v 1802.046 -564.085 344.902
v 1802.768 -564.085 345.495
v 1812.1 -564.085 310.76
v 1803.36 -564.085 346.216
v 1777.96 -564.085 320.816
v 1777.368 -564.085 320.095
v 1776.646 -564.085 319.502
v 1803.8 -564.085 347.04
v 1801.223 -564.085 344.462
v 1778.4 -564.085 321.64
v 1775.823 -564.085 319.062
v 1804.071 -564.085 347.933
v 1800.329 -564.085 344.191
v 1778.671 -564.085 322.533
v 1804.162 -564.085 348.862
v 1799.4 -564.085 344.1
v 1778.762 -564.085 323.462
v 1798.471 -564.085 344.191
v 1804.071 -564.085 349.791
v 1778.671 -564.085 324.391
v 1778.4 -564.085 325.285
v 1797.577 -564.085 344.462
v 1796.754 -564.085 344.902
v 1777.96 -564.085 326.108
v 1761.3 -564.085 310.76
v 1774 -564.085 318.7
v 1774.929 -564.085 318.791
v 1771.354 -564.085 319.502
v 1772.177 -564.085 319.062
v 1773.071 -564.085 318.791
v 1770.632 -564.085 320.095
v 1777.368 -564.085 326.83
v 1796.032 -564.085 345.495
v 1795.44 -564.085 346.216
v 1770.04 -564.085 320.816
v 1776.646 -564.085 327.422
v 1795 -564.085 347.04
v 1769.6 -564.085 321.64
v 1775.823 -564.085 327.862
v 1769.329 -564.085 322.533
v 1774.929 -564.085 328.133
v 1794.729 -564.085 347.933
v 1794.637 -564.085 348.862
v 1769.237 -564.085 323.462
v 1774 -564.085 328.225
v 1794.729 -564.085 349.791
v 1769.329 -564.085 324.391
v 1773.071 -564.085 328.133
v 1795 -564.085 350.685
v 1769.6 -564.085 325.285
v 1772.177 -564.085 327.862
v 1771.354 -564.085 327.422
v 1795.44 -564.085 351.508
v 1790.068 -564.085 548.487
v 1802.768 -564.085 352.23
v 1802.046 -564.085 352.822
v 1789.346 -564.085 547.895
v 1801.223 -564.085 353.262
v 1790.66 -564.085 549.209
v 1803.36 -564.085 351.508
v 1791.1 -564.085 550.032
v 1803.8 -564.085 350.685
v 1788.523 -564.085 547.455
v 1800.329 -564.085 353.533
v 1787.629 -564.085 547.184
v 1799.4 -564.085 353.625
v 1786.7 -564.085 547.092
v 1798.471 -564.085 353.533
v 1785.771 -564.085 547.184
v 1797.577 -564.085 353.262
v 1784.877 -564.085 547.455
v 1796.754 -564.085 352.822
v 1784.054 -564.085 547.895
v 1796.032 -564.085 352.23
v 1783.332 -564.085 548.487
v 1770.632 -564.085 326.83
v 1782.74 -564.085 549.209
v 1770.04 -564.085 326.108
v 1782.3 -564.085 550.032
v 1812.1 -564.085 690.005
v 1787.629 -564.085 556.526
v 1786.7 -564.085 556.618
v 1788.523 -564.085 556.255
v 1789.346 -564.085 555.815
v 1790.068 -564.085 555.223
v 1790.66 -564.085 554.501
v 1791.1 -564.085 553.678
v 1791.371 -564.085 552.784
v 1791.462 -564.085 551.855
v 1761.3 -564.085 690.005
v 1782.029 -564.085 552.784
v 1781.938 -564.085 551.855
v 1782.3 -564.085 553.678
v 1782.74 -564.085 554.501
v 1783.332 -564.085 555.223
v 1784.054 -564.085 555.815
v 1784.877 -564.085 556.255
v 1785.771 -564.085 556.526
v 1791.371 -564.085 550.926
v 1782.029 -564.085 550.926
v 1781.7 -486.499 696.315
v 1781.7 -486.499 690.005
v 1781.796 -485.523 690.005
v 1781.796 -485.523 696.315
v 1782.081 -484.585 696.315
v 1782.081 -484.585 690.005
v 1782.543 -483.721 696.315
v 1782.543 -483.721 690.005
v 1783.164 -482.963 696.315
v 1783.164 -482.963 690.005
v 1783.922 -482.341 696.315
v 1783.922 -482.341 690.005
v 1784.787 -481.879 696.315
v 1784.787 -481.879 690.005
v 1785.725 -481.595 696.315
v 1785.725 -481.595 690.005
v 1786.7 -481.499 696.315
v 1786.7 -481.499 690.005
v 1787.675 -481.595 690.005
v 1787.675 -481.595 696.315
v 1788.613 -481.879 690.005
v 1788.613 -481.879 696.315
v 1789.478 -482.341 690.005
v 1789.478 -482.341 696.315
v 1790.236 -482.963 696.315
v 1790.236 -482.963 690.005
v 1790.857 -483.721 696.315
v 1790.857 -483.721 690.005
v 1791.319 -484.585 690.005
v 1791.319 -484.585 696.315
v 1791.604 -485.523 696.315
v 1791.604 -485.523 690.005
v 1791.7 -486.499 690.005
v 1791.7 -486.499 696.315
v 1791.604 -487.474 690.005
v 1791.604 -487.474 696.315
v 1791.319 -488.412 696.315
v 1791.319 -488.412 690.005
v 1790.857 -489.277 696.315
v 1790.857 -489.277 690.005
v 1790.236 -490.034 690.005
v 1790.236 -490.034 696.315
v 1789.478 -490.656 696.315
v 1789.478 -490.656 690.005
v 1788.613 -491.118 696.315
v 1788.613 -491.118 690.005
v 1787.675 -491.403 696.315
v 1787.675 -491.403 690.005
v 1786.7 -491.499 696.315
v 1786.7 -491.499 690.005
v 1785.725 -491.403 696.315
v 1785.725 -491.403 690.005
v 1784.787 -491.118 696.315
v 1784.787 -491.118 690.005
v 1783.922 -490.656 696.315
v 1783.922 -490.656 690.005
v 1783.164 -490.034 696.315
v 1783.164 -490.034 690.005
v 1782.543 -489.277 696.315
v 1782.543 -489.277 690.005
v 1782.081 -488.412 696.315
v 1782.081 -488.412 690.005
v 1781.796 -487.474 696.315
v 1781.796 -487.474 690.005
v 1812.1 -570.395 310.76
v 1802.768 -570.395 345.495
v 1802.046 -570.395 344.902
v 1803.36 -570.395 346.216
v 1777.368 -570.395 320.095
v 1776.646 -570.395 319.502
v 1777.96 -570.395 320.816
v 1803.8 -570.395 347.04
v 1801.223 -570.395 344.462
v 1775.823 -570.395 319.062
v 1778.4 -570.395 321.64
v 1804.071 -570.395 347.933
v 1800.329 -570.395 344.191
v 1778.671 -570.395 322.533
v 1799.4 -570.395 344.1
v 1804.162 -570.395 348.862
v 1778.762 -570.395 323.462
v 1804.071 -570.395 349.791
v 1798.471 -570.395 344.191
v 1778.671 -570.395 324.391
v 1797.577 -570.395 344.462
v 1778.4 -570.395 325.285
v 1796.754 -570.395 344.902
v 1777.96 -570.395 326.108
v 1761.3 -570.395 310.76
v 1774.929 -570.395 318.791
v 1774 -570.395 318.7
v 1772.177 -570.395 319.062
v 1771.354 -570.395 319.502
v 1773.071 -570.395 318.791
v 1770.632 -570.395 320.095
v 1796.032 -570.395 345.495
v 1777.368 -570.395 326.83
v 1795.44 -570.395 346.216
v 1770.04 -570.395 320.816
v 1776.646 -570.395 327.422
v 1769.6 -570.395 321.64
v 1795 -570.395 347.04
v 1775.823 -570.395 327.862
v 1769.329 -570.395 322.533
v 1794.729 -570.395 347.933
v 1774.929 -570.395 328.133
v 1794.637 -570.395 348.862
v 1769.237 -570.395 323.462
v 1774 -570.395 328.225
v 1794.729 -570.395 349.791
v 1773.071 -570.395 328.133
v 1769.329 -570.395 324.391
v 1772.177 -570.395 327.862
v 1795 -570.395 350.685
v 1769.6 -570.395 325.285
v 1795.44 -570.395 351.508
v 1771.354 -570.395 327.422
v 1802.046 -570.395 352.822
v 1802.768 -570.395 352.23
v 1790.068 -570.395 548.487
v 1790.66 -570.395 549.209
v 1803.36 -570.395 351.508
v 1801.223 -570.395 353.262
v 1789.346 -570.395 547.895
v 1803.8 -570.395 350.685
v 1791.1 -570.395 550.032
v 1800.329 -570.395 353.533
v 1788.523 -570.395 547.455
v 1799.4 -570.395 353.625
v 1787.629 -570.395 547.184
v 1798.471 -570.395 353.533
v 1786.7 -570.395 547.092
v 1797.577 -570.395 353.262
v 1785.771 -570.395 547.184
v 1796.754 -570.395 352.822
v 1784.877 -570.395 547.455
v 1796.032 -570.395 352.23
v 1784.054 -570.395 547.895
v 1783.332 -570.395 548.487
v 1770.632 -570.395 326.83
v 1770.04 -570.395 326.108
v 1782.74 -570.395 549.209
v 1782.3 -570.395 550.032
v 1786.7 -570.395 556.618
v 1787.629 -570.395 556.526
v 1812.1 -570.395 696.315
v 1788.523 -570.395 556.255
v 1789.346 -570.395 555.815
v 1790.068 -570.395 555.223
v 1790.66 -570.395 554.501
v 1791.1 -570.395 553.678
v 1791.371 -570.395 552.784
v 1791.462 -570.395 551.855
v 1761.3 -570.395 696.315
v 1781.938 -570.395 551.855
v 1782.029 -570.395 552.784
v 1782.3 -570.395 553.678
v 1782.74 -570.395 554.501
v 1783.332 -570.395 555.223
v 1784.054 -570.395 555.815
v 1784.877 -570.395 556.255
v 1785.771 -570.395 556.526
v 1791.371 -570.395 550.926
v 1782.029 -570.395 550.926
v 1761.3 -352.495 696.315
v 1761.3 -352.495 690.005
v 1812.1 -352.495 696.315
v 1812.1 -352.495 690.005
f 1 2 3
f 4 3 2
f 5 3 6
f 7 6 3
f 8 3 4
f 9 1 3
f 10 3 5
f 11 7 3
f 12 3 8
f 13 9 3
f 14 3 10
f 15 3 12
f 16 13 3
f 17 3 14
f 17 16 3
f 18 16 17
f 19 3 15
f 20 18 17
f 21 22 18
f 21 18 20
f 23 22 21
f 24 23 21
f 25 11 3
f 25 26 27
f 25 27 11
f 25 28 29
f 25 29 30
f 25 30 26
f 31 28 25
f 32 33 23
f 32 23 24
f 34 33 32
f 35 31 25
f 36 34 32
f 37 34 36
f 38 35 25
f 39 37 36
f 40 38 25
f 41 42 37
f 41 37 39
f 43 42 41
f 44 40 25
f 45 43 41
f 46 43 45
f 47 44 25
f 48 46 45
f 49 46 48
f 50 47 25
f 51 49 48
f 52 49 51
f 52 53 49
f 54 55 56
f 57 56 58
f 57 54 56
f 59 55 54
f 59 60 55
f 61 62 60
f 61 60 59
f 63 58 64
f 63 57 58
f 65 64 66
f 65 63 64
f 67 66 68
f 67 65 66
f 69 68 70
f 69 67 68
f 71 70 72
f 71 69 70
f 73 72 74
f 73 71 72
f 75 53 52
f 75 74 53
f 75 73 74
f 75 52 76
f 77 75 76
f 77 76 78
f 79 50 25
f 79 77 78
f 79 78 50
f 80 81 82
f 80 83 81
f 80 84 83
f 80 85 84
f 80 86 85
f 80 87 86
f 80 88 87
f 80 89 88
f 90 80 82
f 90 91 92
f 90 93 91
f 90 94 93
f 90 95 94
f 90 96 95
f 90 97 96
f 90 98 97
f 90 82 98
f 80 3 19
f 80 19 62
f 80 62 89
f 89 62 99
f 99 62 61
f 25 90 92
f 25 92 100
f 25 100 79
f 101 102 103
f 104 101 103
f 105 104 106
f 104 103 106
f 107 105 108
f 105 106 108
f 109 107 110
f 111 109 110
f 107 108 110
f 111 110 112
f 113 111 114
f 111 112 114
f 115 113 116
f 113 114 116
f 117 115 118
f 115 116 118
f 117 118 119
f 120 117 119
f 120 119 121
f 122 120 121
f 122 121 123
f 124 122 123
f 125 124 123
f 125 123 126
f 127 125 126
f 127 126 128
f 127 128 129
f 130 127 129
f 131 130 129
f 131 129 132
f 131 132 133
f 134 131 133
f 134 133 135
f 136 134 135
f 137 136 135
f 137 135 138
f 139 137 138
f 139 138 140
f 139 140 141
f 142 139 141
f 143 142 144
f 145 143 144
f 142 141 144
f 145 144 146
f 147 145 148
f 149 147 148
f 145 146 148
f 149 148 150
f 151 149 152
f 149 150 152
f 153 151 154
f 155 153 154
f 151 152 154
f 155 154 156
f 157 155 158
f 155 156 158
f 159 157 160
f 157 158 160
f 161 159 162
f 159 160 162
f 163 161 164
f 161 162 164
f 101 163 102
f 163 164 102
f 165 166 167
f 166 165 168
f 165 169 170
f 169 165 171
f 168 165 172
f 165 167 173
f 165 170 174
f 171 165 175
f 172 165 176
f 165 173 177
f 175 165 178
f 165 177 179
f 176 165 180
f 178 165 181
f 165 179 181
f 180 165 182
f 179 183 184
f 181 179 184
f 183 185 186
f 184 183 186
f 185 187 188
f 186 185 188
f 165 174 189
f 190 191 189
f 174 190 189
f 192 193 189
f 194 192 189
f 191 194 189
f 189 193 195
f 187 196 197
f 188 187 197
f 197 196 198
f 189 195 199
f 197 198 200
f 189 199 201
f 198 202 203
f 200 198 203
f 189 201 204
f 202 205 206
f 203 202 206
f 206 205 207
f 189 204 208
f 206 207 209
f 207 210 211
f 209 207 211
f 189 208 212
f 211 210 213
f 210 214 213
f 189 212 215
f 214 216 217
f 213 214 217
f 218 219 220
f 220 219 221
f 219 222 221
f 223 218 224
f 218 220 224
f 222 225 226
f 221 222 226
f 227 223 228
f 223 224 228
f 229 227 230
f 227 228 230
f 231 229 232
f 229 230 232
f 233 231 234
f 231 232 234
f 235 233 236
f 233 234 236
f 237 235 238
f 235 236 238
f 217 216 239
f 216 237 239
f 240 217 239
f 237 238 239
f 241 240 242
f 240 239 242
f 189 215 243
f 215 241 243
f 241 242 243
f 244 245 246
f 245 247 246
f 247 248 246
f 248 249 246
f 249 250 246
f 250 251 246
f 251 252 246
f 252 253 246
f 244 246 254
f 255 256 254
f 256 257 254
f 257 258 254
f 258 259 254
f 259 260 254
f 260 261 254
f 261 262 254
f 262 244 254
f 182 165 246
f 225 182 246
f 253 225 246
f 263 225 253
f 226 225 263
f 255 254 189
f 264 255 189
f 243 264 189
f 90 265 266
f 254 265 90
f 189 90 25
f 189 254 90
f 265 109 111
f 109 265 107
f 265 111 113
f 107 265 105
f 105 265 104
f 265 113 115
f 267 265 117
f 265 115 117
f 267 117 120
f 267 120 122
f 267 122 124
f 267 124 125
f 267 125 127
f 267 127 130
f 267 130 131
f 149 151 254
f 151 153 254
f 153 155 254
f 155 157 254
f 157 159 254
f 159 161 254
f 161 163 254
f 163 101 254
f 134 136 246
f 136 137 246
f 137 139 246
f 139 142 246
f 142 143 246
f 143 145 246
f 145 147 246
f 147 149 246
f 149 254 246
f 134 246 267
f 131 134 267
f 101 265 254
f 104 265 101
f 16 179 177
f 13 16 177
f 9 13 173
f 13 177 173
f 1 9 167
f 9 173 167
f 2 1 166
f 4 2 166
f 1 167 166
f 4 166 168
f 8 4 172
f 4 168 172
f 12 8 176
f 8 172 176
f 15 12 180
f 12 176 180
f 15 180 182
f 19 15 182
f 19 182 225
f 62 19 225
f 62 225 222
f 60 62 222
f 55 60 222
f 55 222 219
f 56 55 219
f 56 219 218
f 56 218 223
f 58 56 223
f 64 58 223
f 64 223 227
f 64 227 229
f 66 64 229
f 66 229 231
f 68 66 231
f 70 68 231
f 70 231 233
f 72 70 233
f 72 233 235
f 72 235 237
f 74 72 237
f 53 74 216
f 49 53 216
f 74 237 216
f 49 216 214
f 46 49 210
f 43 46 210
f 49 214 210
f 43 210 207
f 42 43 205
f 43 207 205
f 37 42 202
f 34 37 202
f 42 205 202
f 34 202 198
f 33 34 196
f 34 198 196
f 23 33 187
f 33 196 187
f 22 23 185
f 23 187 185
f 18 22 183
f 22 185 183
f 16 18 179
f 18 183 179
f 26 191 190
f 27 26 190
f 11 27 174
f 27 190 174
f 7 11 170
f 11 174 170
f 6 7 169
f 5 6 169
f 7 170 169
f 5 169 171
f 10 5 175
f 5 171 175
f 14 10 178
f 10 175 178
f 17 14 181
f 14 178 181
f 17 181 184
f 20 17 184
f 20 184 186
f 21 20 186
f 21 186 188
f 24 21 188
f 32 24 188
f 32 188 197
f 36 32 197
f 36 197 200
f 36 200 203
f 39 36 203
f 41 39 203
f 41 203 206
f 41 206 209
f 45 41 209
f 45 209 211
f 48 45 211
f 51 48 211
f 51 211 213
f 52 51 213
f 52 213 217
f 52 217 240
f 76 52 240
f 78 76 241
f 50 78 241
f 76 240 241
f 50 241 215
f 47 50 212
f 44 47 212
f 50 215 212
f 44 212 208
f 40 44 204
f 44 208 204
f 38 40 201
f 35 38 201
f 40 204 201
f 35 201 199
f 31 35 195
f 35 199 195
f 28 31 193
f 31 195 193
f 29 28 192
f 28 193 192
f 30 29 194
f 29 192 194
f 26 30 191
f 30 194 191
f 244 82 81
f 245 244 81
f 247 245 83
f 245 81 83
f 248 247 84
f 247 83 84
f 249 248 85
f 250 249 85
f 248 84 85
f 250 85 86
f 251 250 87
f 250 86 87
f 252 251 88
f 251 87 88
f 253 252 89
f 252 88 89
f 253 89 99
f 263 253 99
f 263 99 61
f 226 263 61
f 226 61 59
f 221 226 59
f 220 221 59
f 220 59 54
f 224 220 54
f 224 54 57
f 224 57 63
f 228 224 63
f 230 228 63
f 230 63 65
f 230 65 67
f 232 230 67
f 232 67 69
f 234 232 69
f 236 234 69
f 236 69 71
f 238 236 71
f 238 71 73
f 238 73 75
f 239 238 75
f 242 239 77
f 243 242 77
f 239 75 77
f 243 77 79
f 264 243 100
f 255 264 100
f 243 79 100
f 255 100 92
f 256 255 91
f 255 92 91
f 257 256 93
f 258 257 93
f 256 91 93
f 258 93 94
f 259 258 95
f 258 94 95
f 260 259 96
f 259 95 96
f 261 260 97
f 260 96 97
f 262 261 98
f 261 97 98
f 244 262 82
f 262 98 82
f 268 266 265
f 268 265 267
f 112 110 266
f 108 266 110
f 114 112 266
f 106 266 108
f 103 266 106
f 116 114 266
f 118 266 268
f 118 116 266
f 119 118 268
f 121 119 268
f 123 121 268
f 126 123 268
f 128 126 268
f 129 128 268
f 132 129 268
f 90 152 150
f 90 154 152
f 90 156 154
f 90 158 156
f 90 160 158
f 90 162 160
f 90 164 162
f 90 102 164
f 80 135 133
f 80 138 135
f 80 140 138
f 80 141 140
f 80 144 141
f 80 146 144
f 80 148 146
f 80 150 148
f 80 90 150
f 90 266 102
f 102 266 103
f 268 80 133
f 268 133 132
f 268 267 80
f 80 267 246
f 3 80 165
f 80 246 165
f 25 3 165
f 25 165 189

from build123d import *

# Parameters (mm, degrees)
CROQUIS2_W              = 50.8
CROQUIS2_H              = 6.31
CROQUIS3_W              = 50.8
CROQUIS3_H              = 6.31
CROQUIS4_W              = 60
CROQUIS4_H              = 53.155
SALIENTE_EXTRUIR1_DEPTH = 6.31
CROQUIS5_W              = 60
CROQUIS5_H              = 6.31
CORTAR_EXTRUIR1_DEPTH   = 6.31
CORTAR_EXTRUIR2_DEPTH   = 634
CROQUIS8_W              = 50.8
CROQUIS8_H              = 6.31
SALIENTE_EXTRUIR2_DEPTH = 63.5
CROQUIS9_R              = 5
CORTAR_EXTRUIR3_DEPTH   = 10
CROQUIS10_W             = 790.847933
CROQUIS10_H             = 6.31
CORTAR_EXTRUIR4_DEPTH   = 286
CROQUIS11_W             = 50.8
CROQUIS11_H             = 6.31
CROQUIS11_W_2           = 210
CORTAR_EXTRUIR5_DEPTH   = 13.11
CROQUIS12_W             = 50.8
CROQUIS12_H             = 6.31
SALIENTE_EXTRUIR3_DEPTH = 6.35
CROQUIS13_W             = 50.8
CROQUIS13_H             = 6.35
CORTAR_EXTRUIR6_DEPTH   = 6.35
CROQUIS14_W             = 260.8
CROQUIS14_H             = 6.31
CORTAR_EXTRUIR7_DEPTH   = 6.31
CROQUIS15_W             = 50.8
CROQUIS15_H             = 6.31
CORTAR_EXTRUIR8_DEPTH   = 6.31
CROQUIS16_W             = 78.776397836
CROQUIS16_H             = 454.479218284
CORTAR_EXTRUIR9_DEPTH   = 128
CROQUIS22_R             = 4.7625
CORTAR_EXTRUIR15_DEPTH  = 33
CROQUIS24_R             = 5.000000022
CORTAR_EXTRUIR18_DEPTH  = 33
CROQUIS25_R             = 4.7625
CORTAR_EXTRUIR19_DEPTH  = 50
CROQUIS26_W             = 50.8
CROQUIS26_H             = 6.31
SALIENTE_EXTRUIR4_DEPTH = 100


with BuildPart() as part:
    # Barrer1: sweep along a curve in space
    with BuildLine() as barrer1_path:
        Line((0, 0, 0), (0, -567.24, 0))
        Line((0, -567.24, 0), (0, -567.24, 336.2))
        Line((0, -567.24, 336.2), (1786.7, -567.24, 336.2))
        Line((1786.7, -567.24, 336.2), (1786.7, -567.24, 693.16))
        Line((1786.7, -567.24, 693.16), (1786.7, -436.23, 693.16))
        Line((1786.7, -436.23, 693.16), (1786.7, -436.23, 1487.162933))
    # Croquis2 → Barrer1 (sweep)
    with BuildSketch(Plane(origin=(0, 0, 0), x_dir=(1, 0, 0), z_dir=(0, 1, 0))):
        Rectangle(CROQUIS2_W, CROQUIS2_H)
        with Locations((210, 0)):
            Rectangle(CROQUIS2_W, CROQUIS2_H)
    sweep(path=barrer1_path.line, transition=Transition.RIGHT)

    # Barrer4: sweep along a curve in space
    with BuildLine() as barrer4_path:
        Line((-0.201028049, -3.155, -3.155), (-0.201028049, -3.155, -207.155))
        Line((-0.201028049, -3.155, -207.155), (-0.201028049, -53.155, -207.155))
    # Croquis3 → Barrer4 (sweep)
    with BuildSketch(Plane(origin=(0, 0, -3.155), x_dir=(-1, 0, 0), z_dir=(0, 0, -1))):
        with Locations((-210, -3.155)):
            Rectangle(CROQUIS3_W, CROQUIS3_H)
        with Locations((0, -3.155)):
            Rectangle(CROQUIS3_W, CROQUIS3_H)
    sweep(path=barrer4_path.line, transition=Transition.RIGHT)

    # Croquis4 → Saliente-Extruir1 (add)
    with BuildSketch(Plane(origin=(0, 0, -210.31), x_dir=(-1, 0, 0), z_dir=(0, 0, -1))):
        with Locations((-154.6, -26.5775)):
            Rectangle(CROQUIS4_W, CROQUIS4_H)
    extrude(amount=-SALIENTE_EXTRUIR1_DEPTH)

    # Croquis5 → Cortar-Extruir1 (cut)
    with BuildSketch(Plane.XY.offset(-204)):
        with Locations((154.6, -3.155)):
            Rectangle(CROQUIS5_W, CROQUIS5_H)
    extrude(amount=-CORTAR_EXTRUIR1_DEPTH, mode=Mode.SUBTRACT)

    # Croquis7 → Cortar-Extruir2 (cut)
    with BuildSketch(Plane(origin=(0, 0, 0), x_dir=(1, 0, 0), z_dir=(0, 1, 0))):
        Polygon((1761.3, -361.6), (2022.1, -361.6), (2022.1, 278.600557529), (-188.115947115, 278.600557529), (-188.115947115, -361.6), align=None)
    extrude(amount=-CORTAR_EXTRUIR2_DEPTH, mode=Mode.SUBTRACT)

    # Croquis8 → Saliente-Extruir2 (add)
    with BuildSketch(Plane(origin=(0, 0, 361.6), x_dir=(-1, 0, 0), z_dir=(0, 0, -1))):
        with Locations((-1786.7, -567.24)):
            Rectangle(CROQUIS8_W, CROQUIS8_H)
    extrude(amount=SALIENTE_EXTRUIR2_DEPTH)

    # Croquis9 → Cortar-Extruir3 (cut)
    with BuildSketch(Plane(origin=(0, -433.075, 0), x_dir=(1, 0, 0), z_dir=(0, 1, 0))):
        with Locations(Location((1786.7, -1454.162933, 0), (0, 0, 270))):
            Circle(CROQUIS9_R)
        with Locations(Location((1786.7, -1234.162933, 0), (0, 0, 270))):
            Circle(CROQUIS9_R)
        with Locations(Location((1996.7, -1234.162933, 0), (0, 0, 270))):
            Circle(CROQUIS9_R)
        with Locations(Location((1996.7, -1454.162933, 0), (0, 0, 270))):
            Circle(CROQUIS9_R)
    extrude(amount=-CORTAR_EXTRUIR3_DEPTH, mode=Mode.SUBTRACT)

    # Croquis10 → Cortar-Extruir4 (cut)
    with BuildSketch(Plane(origin=(2022.1, 0, 0), x_dir=(0, 0, -1), z_dir=(1, 0, 0))):
        with Locations((-1091.7389665, -436.23)):
            Rectangle(CROQUIS10_W, CROQUIS10_H)
    extrude(amount=-CORTAR_EXTRUIR4_DEPTH, mode=Mode.SUBTRACT)

    # Croquis11 → Cortar-Extruir5 (cut)
    with BuildSketch(Plane(origin=(0, -433.075, 0), x_dir=(1, 0, 0), z_dir=(0, 1, 0))):
        with Locations((1996.7, -693.16)):
            Rectangle(CROQUIS11_W, CROQUIS11_H)
        with Locations((1866.3, -693.16)):
            Rectangle(CROQUIS11_W_2, CROQUIS11_H)
    extrude(amount=-CORTAR_EXTRUIR5_DEPTH, mode=Mode.SUBTRACT)

    # Croquis12 → Saliente-Extruir3 (add)
    with BuildSketch(Plane(origin=(0, 0, 361.6), x_dir=(-1, 0, 0), z_dir=(0, 0, -1))):
        with Locations((-1996.7, -567.24)):
            Rectangle(CROQUIS12_W, CROQUIS12_H)
    extrude(amount=SALIENTE_EXTRUIR3_DEPTH)

    # Croquis13 → Cortar-Extruir6 (cut)
    with BuildSketch(Plane(origin=(0, -564.085, 0), x_dir=(1, 0, 0), z_dir=(0, 1, 0))):
        with Locations((1786.7, -301.275)):
            Rectangle(CROQUIS13_W, CROQUIS13_H)
    extrude(amount=-CORTAR_EXTRUIR6_DEPTH, mode=Mode.SUBTRACT)

    # Croquis14 → Cortar-Extruir7 (cut)
    with BuildSketch(Plane(origin=(0, -446.185, 0), x_dir=(1, 0, 0), z_dir=(0, 1, 0))):
        with Locations((1891.7, -693.16)):
            Rectangle(CROQUIS14_W, CROQUIS14_H)
    extrude(amount=-CORTAR_EXTRUIR7_DEPTH, mode=Mode.SUBTRACT)

    # Croquis15 → Cortar-Extruir8 (cut)
    with BuildSketch(Plane(origin=(0, 0, 304.45), x_dir=(-1, 0, 0), z_dir=(0, 0, -1))):
        with Locations((-1786.7, -567.24)):
            Rectangle(CROQUIS15_W, CROQUIS15_H)
    extrude(amount=-CORTAR_EXTRUIR8_DEPTH, mode=Mode.SUBTRACT)

    # Croquis16 → Cortar-Extruir9 (cut)
    with BuildSketch(Plane(origin=(0, -452.495, 0), x_dir=(1, 0, 0), z_dir=(0, 1, 0))):
        with Locations((1993.809618139, -557.908989907)):
            Rectangle(CROQUIS16_W, CROQUIS16_H)
    extrude(amount=-CORTAR_EXTRUIR9_DEPTH, mode=Mode.SUBTRACT)

    # Croquis22 → Cortar-Extruir15 (cut)
    with BuildSketch(Plane(origin=(0, -564.085, 0), x_dir=(1, 0, 0), z_dir=(0, 1, 0))):
        with Locations(Location((1786.7, -551.855, 0), (0, 0, 270))):
            Circle(CROQUIS22_R)
    extrude(amount=-CORTAR_EXTRUIR15_DEPTH, mode=Mode.SUBTRACT)

    # Croquis24 → Cortar-Extruir18 (cut)
    with BuildSketch(Plane(origin=(0, 0, 690.005), x_dir=(-1, 0, 0), z_dir=(0, 0, -1))):
        with Locations((-1786.700000078, -486.49871274)):
            Circle(CROQUIS24_R)
    extrude(amount=-CORTAR_EXTRUIR18_DEPTH, mode=Mode.SUBTRACT)

    # Croquis25 → Cortar-Extruir19 (cut)
    with BuildSketch(Plane(origin=(0, -570.395, 0), x_dir=(-1, 0, 0), z_dir=(0, -1, 0))):
        with Locations(Location((-1799.399999999, -348.862204666, 0), (0, 0, 90))):
            Circle(CROQUIS25_R)
        with Locations(Location((-1773.999999999, -323.462204666, 0), (0, 0, 90))):
            Circle(CROQUIS25_R)
    extrude(amount=-CORTAR_EXTRUIR19_DEPTH, mode=Mode.SUBTRACT)

    # Croquis26 → Saliente-Extruir4 (add)
    with BuildSketch(Plane(origin=(0, -452.495, 0), x_dir=(1, 0, 0), z_dir=(0, 1, 0))):
        with Locations((1786.7, -693.16)):
            Rectangle(CROQUIS26_W, CROQUIS26_H)
    extrude(amount=SALIENTE_EXTRUIR4_DEPTH)


solid = part.part
